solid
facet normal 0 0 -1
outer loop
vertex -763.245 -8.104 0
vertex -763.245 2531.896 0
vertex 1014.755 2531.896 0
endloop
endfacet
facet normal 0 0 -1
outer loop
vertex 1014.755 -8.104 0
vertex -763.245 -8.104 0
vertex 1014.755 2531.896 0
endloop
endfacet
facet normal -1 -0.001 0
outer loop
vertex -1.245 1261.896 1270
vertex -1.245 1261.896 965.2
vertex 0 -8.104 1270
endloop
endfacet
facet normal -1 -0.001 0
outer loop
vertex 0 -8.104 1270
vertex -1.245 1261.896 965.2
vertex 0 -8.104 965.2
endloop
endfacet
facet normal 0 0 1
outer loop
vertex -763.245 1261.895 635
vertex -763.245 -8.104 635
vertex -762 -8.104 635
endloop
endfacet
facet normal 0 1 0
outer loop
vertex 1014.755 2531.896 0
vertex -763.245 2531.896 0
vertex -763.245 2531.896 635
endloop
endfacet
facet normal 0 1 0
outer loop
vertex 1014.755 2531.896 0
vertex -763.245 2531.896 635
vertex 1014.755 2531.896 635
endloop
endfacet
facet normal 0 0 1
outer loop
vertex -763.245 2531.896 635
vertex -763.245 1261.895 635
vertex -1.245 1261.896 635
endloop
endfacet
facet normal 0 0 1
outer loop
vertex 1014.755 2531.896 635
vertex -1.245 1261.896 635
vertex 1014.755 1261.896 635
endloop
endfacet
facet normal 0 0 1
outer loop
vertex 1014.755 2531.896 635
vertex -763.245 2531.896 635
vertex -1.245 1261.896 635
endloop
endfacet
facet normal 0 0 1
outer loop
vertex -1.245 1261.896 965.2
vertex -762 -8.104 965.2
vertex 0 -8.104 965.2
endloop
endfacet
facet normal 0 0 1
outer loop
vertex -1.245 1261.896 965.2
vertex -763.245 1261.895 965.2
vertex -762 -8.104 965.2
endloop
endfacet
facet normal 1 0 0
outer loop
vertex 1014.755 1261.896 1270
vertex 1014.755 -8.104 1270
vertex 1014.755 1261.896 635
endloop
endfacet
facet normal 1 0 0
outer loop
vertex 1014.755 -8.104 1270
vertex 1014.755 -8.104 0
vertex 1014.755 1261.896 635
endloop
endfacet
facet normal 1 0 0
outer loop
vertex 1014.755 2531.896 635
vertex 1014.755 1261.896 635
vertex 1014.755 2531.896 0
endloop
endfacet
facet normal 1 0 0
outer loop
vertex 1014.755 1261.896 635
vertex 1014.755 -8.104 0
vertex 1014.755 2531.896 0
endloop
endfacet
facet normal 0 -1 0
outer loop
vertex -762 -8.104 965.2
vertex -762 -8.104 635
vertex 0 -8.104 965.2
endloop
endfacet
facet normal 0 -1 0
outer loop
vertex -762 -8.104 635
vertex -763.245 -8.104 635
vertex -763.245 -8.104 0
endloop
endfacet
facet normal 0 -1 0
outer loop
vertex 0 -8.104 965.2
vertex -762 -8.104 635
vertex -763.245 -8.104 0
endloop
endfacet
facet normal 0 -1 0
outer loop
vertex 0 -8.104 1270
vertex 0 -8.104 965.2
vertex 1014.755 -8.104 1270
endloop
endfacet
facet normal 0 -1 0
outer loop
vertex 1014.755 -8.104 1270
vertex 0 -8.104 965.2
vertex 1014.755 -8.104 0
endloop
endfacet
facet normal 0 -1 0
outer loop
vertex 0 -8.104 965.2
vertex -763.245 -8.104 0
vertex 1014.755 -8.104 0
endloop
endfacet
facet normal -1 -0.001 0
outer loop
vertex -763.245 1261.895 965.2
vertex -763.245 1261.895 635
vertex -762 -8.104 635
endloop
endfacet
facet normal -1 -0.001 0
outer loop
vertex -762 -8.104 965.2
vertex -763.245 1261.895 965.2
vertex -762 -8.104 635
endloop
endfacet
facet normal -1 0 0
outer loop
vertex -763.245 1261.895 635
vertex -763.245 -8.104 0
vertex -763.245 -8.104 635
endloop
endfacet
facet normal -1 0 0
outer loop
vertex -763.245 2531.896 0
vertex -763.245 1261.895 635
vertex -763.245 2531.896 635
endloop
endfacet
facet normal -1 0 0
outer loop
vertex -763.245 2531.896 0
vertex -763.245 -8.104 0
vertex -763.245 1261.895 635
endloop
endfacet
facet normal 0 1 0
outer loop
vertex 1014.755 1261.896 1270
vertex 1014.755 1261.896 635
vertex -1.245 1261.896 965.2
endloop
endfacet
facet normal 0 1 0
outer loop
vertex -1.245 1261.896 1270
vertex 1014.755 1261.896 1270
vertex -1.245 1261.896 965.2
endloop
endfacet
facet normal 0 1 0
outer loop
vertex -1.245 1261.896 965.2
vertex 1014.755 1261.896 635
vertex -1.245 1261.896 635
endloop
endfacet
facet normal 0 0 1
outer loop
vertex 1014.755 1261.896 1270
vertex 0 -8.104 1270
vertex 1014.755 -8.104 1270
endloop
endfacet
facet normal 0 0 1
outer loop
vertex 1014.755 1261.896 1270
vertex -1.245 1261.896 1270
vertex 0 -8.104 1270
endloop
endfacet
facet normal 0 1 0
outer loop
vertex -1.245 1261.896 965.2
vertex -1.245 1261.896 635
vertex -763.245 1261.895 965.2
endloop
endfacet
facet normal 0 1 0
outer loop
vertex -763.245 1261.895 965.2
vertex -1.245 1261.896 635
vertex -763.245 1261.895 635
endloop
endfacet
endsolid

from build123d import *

# Parameters (mm, degrees)
F0_W     = 1778
F0_H     = 2540
F1_DEPTH = 635
F3_DEPTH = 635
F5_DEPTH = 330.2


with BuildPart() as f1:
    # F0 (on Top) → F1 (new body)
    with BuildSketch(Plane.XY):
        with Locations((125.754644, 1261.896089)):
            Rectangle(F0_W, F0_H)
    extrude(amount=F1_DEPTH)

    # F2 (on face) → F3 (join)
    with BuildSketch(Plane.XY.offset(635)):
        Polygon((0, -8.103911), (1014.754644, -8.103911), (1014.754644, 1261.896089), (-1.245356, 1261.896089), align=None)
    extrude(amount=F3_DEPTH)

    # F4 (on face) → F5 (join)
    with BuildSketch(Plane.XY.offset(635)):
        Polygon((-762, -8.103911), (0, -8.103911), (-1.245356, 1261.896089), (-763.245356, 1261.895478), align=None)
    extrude(amount=F5_DEPTH)


solid = f1.part
